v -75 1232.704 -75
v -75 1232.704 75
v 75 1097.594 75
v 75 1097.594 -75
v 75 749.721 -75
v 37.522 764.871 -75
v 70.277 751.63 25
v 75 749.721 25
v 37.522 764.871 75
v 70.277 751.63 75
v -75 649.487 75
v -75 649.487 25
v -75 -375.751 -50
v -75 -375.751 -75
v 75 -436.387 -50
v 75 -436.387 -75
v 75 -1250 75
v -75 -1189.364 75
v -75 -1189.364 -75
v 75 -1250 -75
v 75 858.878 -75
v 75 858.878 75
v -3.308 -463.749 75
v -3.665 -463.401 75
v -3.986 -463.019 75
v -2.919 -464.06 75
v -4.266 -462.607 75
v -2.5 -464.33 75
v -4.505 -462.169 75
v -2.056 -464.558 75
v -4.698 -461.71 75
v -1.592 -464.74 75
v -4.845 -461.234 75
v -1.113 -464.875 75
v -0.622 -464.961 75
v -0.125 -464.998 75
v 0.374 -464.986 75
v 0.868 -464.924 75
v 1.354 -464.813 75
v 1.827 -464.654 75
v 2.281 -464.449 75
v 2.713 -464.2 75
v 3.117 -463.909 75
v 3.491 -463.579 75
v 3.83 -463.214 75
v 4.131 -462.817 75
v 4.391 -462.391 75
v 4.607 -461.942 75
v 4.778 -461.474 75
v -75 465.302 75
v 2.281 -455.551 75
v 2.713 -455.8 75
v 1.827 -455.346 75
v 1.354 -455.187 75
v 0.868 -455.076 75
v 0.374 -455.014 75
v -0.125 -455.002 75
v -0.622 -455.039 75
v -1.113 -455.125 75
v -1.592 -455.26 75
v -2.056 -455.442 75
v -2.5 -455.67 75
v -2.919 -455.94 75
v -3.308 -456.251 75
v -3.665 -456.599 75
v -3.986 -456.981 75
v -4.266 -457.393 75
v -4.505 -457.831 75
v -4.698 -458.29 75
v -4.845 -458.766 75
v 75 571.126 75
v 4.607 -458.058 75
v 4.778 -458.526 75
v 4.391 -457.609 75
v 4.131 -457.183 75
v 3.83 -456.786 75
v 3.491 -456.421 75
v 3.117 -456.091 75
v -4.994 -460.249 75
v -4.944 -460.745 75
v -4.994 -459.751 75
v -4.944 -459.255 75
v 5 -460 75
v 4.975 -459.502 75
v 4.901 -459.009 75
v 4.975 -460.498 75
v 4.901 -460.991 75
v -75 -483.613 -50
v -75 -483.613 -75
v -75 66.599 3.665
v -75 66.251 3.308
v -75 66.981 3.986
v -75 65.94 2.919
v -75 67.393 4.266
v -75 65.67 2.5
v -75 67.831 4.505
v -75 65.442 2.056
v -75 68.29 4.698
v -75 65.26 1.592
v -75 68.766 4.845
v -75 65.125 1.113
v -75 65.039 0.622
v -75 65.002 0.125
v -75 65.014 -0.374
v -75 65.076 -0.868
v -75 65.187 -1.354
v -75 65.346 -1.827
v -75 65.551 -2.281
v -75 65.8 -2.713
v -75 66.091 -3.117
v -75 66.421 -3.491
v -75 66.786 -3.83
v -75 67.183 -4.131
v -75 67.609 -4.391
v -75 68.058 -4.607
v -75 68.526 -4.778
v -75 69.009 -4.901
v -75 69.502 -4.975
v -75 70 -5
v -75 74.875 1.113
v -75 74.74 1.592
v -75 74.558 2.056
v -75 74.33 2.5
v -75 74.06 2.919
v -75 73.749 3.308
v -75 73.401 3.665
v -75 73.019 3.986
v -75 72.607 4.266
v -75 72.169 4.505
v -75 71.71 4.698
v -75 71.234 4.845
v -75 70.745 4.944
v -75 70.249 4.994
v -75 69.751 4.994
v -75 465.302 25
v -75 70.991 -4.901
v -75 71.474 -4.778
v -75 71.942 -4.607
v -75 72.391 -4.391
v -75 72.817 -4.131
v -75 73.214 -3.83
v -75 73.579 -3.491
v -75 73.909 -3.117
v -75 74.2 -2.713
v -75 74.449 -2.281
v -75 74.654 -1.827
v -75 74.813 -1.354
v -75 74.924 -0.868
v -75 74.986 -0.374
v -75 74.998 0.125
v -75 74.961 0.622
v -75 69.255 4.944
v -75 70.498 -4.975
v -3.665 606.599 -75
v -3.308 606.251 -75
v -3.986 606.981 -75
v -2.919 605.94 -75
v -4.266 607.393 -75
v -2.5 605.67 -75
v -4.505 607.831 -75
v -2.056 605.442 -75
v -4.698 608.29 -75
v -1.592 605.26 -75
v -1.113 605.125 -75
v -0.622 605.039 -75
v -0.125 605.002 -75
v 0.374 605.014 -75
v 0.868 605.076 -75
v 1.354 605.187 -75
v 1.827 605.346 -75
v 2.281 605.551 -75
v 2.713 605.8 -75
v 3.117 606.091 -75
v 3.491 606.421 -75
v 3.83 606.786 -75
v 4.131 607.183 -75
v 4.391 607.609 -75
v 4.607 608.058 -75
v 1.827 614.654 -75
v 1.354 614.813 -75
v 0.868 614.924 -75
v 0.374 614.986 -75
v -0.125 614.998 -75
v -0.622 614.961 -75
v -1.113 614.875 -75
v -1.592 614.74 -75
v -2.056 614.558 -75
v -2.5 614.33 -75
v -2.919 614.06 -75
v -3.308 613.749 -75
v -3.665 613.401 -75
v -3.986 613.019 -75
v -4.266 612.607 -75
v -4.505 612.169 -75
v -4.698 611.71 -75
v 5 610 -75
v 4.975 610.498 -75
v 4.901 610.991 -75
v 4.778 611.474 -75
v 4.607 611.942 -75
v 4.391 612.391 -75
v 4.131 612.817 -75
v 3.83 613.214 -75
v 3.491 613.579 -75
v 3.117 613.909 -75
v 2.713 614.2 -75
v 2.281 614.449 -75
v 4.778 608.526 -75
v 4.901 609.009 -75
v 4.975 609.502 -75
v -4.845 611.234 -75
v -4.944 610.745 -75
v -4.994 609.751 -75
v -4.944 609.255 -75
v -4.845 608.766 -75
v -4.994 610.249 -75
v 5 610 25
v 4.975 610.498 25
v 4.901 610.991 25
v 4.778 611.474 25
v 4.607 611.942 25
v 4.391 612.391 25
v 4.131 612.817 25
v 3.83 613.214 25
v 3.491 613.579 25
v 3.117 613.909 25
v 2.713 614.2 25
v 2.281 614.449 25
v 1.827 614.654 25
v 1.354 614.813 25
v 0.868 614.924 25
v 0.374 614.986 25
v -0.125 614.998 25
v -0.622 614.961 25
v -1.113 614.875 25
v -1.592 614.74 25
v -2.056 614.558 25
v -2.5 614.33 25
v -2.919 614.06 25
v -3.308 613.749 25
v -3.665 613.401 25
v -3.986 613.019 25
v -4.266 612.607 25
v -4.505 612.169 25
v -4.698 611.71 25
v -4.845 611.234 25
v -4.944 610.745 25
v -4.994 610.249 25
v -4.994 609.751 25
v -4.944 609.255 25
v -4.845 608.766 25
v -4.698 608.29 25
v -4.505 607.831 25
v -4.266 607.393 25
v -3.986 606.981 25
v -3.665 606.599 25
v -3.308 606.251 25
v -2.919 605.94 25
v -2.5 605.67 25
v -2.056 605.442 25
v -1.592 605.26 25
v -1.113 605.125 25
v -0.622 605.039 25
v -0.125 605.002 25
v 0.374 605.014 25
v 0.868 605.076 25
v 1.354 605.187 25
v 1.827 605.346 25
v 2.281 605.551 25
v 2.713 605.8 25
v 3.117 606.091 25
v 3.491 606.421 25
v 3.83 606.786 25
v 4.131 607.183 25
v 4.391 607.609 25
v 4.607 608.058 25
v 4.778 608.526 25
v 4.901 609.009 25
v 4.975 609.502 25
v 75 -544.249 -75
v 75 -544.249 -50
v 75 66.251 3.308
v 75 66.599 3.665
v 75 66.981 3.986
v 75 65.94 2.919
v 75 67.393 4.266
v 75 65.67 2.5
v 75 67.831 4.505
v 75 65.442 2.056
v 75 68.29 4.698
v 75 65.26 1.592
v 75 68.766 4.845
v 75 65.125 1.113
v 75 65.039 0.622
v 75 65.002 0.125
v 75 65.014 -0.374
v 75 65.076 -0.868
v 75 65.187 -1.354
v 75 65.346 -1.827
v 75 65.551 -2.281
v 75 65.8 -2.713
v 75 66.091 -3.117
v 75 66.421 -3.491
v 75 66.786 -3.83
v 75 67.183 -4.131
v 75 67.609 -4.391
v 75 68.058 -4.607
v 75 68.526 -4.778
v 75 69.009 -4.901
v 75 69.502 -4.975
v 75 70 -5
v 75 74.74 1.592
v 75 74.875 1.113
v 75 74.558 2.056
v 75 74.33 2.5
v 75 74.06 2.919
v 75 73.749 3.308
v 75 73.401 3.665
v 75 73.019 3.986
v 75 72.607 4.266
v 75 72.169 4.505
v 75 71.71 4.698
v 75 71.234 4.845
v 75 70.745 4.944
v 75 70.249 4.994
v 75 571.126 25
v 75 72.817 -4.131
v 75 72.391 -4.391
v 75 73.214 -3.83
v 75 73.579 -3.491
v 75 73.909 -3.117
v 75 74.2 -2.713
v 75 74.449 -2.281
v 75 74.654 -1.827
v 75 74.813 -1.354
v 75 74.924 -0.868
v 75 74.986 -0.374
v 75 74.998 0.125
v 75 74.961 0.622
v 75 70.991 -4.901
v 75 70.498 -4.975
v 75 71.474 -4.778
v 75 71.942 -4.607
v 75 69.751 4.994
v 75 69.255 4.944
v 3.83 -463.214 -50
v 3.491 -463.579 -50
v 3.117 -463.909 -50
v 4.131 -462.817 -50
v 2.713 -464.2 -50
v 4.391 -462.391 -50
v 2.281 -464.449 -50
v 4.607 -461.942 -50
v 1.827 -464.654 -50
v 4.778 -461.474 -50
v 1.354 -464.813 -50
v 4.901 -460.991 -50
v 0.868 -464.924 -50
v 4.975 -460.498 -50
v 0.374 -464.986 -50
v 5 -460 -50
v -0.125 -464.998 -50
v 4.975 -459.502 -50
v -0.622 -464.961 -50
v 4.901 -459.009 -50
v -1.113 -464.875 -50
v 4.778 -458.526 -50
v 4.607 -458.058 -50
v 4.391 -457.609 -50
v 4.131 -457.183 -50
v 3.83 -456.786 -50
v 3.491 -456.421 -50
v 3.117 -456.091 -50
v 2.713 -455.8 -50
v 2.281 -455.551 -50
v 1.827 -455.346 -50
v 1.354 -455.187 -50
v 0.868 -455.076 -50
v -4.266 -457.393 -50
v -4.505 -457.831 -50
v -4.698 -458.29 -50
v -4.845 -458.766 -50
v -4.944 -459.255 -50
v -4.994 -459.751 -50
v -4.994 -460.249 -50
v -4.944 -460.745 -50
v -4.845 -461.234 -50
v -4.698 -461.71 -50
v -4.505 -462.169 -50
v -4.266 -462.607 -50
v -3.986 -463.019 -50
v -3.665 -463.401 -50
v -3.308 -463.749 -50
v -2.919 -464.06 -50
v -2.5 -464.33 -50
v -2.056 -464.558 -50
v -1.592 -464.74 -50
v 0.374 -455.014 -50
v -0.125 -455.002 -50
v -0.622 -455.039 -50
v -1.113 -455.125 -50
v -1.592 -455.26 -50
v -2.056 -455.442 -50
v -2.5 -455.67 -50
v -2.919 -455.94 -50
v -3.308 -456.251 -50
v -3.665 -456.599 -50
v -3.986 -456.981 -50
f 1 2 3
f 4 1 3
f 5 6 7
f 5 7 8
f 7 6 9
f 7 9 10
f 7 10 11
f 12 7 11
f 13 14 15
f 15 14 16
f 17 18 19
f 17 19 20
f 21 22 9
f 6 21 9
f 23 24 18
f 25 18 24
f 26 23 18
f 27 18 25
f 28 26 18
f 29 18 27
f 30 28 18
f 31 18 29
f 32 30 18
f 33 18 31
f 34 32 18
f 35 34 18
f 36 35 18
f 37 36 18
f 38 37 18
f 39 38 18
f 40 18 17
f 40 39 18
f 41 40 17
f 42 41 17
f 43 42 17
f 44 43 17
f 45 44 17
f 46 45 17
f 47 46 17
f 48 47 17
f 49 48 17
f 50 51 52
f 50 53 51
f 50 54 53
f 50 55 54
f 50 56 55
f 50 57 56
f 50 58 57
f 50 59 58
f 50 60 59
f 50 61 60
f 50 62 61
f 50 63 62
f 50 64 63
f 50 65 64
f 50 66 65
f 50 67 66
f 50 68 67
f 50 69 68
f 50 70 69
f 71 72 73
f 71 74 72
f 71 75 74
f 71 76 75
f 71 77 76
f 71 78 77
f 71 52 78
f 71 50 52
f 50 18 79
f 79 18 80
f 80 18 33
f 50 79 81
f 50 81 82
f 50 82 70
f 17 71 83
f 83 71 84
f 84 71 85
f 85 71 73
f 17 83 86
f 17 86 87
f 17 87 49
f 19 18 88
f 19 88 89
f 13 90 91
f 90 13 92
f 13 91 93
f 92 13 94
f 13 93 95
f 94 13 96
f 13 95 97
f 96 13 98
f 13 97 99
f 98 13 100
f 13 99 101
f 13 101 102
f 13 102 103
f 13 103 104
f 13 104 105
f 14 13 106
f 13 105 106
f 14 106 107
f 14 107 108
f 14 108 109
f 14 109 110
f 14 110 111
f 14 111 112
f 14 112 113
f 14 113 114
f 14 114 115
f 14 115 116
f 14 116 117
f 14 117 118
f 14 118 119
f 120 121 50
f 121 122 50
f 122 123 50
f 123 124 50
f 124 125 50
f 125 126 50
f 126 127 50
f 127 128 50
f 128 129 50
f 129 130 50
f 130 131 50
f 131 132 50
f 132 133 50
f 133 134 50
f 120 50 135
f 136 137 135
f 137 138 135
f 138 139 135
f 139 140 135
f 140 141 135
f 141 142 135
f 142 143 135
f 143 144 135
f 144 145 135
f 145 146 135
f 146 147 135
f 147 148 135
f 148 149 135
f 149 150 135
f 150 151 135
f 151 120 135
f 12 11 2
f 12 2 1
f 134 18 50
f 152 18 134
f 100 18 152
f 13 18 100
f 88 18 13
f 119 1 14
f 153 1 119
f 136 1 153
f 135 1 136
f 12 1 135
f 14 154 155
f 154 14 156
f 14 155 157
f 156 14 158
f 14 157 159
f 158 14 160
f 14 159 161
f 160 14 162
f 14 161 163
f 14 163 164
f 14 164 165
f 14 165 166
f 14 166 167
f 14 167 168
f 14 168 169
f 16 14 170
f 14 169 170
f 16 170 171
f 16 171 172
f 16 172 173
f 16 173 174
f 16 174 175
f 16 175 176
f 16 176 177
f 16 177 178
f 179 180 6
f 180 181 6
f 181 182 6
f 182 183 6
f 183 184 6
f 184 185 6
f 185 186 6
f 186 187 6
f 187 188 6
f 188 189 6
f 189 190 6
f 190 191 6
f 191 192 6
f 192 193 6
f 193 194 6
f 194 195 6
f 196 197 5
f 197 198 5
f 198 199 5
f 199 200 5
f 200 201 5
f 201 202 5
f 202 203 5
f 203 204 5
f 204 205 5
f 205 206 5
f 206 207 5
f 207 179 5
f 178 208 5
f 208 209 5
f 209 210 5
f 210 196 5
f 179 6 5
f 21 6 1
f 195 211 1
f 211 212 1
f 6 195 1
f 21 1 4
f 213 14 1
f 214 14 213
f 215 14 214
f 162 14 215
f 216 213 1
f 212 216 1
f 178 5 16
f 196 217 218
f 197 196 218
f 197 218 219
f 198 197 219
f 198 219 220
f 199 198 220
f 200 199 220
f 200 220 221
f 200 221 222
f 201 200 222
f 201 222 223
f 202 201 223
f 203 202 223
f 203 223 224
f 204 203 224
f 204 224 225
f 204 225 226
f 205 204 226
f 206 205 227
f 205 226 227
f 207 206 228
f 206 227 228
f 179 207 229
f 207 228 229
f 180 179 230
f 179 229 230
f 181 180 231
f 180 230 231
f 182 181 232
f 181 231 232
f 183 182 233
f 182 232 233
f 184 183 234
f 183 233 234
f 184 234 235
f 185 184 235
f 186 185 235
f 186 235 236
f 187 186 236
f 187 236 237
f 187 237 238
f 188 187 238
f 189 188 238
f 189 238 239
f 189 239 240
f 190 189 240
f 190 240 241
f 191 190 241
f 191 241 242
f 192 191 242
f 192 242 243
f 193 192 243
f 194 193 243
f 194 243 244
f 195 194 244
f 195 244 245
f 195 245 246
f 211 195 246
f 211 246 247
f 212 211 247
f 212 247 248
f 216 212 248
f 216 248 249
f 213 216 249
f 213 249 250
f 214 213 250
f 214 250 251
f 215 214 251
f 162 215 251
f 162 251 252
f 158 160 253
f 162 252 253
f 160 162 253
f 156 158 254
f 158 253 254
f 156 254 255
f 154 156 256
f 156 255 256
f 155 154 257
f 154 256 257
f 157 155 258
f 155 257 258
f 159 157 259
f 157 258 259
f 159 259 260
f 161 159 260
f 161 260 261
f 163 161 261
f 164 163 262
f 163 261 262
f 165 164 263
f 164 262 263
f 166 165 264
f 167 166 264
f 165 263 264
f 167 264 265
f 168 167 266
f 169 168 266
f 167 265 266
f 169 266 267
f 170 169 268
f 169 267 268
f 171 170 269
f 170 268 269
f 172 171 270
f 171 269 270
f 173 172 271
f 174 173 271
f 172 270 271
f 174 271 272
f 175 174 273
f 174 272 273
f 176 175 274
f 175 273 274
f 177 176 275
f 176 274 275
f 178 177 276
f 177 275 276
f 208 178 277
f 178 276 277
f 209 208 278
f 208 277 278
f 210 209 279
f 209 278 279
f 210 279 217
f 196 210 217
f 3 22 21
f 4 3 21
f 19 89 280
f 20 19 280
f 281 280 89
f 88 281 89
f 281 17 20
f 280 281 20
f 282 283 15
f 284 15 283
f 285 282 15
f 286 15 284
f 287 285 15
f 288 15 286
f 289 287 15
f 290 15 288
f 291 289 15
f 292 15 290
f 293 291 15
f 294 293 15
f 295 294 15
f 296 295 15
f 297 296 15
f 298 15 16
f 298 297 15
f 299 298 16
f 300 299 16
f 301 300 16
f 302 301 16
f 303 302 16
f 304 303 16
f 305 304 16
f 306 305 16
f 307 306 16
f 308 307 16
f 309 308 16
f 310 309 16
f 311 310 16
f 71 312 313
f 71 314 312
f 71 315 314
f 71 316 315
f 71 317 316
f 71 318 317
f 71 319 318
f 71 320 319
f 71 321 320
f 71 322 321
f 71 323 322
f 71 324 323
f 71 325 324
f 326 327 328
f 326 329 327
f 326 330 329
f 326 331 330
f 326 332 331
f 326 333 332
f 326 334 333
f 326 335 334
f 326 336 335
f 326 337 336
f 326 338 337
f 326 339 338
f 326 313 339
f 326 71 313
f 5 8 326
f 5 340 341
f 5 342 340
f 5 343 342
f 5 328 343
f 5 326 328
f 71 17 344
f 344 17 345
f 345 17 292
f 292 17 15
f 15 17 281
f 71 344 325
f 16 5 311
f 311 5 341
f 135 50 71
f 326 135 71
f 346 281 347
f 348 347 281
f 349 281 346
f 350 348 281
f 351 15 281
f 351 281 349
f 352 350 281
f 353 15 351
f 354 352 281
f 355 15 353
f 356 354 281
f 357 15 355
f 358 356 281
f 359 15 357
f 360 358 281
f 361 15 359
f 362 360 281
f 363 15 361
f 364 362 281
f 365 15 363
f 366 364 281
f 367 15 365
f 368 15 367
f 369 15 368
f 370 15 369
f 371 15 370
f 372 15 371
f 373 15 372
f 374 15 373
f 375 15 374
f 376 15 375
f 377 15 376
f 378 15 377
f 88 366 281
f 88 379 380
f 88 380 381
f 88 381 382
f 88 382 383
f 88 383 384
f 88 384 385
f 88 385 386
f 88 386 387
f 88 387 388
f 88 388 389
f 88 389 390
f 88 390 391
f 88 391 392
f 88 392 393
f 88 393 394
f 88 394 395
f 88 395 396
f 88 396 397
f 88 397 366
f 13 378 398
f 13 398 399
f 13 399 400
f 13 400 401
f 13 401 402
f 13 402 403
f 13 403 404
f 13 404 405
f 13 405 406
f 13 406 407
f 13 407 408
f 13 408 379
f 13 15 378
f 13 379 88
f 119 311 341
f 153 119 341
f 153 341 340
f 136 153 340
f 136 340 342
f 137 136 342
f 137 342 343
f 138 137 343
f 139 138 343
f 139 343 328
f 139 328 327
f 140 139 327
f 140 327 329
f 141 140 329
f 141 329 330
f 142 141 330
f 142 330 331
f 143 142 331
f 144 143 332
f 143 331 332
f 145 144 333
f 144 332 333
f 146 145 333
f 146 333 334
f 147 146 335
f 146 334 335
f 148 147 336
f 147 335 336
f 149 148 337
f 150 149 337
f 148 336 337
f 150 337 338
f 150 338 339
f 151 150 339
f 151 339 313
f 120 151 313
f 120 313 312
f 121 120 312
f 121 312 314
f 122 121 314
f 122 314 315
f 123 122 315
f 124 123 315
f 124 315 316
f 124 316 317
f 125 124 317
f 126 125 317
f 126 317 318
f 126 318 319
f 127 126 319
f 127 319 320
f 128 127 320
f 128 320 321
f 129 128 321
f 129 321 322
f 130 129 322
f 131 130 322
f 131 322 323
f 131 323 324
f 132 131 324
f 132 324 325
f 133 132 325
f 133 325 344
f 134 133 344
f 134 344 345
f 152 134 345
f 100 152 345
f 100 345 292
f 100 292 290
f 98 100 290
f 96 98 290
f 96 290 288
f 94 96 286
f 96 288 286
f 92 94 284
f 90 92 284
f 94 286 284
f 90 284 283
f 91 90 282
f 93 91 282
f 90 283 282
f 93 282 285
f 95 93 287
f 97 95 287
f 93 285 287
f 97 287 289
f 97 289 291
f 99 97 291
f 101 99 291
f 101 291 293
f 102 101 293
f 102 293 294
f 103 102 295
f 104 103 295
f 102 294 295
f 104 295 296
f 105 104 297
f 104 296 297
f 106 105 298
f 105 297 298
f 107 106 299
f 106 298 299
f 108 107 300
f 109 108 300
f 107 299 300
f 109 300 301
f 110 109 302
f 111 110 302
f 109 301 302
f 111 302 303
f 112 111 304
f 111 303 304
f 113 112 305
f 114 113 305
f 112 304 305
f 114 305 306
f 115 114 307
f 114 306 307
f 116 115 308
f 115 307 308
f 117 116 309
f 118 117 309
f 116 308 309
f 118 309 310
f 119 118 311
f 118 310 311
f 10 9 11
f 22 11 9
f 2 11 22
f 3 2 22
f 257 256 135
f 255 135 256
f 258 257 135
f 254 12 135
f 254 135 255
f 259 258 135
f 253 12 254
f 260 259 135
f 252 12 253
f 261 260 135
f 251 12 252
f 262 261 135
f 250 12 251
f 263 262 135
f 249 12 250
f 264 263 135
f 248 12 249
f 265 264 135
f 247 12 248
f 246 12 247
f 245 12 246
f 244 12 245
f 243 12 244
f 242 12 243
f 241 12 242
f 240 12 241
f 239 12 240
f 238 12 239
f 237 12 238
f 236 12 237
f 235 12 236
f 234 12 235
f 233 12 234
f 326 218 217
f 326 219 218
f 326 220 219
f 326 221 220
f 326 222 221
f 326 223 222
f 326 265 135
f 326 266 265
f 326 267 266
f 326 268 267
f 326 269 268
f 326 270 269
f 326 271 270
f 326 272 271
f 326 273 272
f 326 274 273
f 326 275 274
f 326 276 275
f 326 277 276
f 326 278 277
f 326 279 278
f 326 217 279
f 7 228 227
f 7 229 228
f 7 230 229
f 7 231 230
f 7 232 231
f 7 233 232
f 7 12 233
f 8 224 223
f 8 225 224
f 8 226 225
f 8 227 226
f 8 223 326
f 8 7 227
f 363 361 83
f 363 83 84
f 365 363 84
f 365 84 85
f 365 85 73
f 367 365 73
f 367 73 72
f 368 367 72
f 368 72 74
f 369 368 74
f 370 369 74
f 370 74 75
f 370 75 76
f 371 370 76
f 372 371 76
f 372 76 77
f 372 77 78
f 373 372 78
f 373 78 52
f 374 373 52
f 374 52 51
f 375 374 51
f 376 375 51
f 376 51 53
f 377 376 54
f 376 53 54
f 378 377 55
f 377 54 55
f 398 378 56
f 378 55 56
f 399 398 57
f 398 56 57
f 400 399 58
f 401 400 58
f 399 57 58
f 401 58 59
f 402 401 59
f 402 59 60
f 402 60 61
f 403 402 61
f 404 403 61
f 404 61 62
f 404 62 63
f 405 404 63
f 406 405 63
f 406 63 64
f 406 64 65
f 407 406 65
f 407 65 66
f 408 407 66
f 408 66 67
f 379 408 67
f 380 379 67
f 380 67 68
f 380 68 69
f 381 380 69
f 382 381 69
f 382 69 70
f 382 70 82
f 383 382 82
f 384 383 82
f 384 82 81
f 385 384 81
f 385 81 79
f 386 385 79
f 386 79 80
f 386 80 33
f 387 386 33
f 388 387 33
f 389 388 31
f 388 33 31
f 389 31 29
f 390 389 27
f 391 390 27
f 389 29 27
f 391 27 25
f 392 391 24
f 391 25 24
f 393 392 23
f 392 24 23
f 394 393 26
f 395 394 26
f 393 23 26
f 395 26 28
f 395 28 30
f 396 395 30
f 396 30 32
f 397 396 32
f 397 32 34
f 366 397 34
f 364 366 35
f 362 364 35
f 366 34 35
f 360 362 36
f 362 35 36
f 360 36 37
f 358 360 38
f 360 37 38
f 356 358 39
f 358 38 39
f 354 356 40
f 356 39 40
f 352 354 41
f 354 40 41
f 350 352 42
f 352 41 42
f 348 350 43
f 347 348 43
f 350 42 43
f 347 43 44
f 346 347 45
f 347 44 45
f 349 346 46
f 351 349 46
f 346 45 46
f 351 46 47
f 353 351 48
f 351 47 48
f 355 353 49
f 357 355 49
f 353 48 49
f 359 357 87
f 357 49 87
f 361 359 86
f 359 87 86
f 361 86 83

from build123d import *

# Parameters (mm, degrees)
SKETCH1_W           = 150
SKETCH1_H           = 150
BOSS_EXTRUDE1_DEPTH = 1250
SKETCH2_R           = 5
CUT_EXTRUDE1_DEPTH  = 1262.199825563
ROOFCUT_DEPTH       = 1262.199825563
TOPCUT_DEPTH        = 1262.199825563
SKETCH5_R           = 5
CUT_EXTRUDE4_DEPTH  = 1262.199825563
CUT_EXTRUDE5_DEPTH  = 50
CUT_EXTRUDE6_DEPTH  = 25
CUT_EXTRUDE7_DEPTH  = 1262.199825563


with BuildPart() as part:
    # Sketch1 → Boss-Extrude1 (new, symmetric)
    with BuildSketch(Plane(origin=(0, 0, 0), x_dir=(1, 0, 0), z_dir=(0, 1, 0))):
        Rectangle(SKETCH1_W, SKETCH1_H)
    extrude(amount=BOSS_EXTRUDE1_DEPTH, both=True)

    # Sketch2 → Cut-Extrude1 (cut, through all)
    with BuildSketch(Plane.XY.offset(75)):
        with Locations((0, 610)):
            Circle(SKETCH2_R)
        with Locations((0, -460)):
            Circle(SKETCH2_R)
    extrude(amount=-CUT_EXTRUDE1_DEPTH, mode=Mode.SUBTRACT)

    # Sketch3 → RoofCut (cut, through all)
    with BuildSketch(Plane.XY.offset(75)):
        Polygon((-75, 1232.703797136), (75, 1097.593747534), (75, 1250), (-75, 1250), align=None)
    extrude(amount=-ROOFCUT_DEPTH, mode=Mode.SUBTRACT)

    # Sketch4 → TopCut (cut, through all)
    with BuildSketch(Plane.XY.offset(75)):
        Polygon((75, 858.878428235), (37.522465852, 764.870707964), (75, 749.720866047), align=None)
    extrude(amount=-TOPCUT_DEPTH, mode=Mode.SUBTRACT)

    # Sketch5 → Cut-Extrude4 (cut, through all)
    with BuildSketch(Plane(origin=(75, 0, 0), x_dir=(0, 0, -1), z_dir=(1, 0, 0))):
        with Locations((0, 70)):
            Circle(SKETCH5_R)
    extrude(amount=-CUT_EXTRUDE4_DEPTH, mode=Mode.SUBTRACT)

    # Sketch7 → Cut-Extrude5 (cut)
    with BuildSketch(Plane.XY.offset(75)):
        Polygon((-75, 649.486666068), (-75, 465.302341615), (75, 571.125839473), (75, 754.950569225), align=None)
    extrude(amount=-CUT_EXTRUDE5_DEPTH, mode=Mode.SUBTRACT)

    # Sketch8 → Cut-Extrude6 (cut)
    with BuildSketch(Plane(origin=(0, 0, -75), x_dir=(-1, 0, 0), z_dir=(0, 0, -1))):
        Polygon((-78.608377022, -545.707193758), (75, -483.612856927), (75, -375.751449205), (-75, -436.387143073), align=None)
    extrude(amount=-CUT_EXTRUDE6_DEPTH, mode=Mode.SUBTRACT)

    # Sketch9 → Cut-Extrude7 (cut, through all)
    with BuildSketch(Plane.XY.offset(75)):
        Polygon((-75, -1189.364306132), (75, -1250), (-75, -1250), align=None)
    extrude(amount=-CUT_EXTRUDE7_DEPTH, mode=Mode.SUBTRACT)


solid = part.part
